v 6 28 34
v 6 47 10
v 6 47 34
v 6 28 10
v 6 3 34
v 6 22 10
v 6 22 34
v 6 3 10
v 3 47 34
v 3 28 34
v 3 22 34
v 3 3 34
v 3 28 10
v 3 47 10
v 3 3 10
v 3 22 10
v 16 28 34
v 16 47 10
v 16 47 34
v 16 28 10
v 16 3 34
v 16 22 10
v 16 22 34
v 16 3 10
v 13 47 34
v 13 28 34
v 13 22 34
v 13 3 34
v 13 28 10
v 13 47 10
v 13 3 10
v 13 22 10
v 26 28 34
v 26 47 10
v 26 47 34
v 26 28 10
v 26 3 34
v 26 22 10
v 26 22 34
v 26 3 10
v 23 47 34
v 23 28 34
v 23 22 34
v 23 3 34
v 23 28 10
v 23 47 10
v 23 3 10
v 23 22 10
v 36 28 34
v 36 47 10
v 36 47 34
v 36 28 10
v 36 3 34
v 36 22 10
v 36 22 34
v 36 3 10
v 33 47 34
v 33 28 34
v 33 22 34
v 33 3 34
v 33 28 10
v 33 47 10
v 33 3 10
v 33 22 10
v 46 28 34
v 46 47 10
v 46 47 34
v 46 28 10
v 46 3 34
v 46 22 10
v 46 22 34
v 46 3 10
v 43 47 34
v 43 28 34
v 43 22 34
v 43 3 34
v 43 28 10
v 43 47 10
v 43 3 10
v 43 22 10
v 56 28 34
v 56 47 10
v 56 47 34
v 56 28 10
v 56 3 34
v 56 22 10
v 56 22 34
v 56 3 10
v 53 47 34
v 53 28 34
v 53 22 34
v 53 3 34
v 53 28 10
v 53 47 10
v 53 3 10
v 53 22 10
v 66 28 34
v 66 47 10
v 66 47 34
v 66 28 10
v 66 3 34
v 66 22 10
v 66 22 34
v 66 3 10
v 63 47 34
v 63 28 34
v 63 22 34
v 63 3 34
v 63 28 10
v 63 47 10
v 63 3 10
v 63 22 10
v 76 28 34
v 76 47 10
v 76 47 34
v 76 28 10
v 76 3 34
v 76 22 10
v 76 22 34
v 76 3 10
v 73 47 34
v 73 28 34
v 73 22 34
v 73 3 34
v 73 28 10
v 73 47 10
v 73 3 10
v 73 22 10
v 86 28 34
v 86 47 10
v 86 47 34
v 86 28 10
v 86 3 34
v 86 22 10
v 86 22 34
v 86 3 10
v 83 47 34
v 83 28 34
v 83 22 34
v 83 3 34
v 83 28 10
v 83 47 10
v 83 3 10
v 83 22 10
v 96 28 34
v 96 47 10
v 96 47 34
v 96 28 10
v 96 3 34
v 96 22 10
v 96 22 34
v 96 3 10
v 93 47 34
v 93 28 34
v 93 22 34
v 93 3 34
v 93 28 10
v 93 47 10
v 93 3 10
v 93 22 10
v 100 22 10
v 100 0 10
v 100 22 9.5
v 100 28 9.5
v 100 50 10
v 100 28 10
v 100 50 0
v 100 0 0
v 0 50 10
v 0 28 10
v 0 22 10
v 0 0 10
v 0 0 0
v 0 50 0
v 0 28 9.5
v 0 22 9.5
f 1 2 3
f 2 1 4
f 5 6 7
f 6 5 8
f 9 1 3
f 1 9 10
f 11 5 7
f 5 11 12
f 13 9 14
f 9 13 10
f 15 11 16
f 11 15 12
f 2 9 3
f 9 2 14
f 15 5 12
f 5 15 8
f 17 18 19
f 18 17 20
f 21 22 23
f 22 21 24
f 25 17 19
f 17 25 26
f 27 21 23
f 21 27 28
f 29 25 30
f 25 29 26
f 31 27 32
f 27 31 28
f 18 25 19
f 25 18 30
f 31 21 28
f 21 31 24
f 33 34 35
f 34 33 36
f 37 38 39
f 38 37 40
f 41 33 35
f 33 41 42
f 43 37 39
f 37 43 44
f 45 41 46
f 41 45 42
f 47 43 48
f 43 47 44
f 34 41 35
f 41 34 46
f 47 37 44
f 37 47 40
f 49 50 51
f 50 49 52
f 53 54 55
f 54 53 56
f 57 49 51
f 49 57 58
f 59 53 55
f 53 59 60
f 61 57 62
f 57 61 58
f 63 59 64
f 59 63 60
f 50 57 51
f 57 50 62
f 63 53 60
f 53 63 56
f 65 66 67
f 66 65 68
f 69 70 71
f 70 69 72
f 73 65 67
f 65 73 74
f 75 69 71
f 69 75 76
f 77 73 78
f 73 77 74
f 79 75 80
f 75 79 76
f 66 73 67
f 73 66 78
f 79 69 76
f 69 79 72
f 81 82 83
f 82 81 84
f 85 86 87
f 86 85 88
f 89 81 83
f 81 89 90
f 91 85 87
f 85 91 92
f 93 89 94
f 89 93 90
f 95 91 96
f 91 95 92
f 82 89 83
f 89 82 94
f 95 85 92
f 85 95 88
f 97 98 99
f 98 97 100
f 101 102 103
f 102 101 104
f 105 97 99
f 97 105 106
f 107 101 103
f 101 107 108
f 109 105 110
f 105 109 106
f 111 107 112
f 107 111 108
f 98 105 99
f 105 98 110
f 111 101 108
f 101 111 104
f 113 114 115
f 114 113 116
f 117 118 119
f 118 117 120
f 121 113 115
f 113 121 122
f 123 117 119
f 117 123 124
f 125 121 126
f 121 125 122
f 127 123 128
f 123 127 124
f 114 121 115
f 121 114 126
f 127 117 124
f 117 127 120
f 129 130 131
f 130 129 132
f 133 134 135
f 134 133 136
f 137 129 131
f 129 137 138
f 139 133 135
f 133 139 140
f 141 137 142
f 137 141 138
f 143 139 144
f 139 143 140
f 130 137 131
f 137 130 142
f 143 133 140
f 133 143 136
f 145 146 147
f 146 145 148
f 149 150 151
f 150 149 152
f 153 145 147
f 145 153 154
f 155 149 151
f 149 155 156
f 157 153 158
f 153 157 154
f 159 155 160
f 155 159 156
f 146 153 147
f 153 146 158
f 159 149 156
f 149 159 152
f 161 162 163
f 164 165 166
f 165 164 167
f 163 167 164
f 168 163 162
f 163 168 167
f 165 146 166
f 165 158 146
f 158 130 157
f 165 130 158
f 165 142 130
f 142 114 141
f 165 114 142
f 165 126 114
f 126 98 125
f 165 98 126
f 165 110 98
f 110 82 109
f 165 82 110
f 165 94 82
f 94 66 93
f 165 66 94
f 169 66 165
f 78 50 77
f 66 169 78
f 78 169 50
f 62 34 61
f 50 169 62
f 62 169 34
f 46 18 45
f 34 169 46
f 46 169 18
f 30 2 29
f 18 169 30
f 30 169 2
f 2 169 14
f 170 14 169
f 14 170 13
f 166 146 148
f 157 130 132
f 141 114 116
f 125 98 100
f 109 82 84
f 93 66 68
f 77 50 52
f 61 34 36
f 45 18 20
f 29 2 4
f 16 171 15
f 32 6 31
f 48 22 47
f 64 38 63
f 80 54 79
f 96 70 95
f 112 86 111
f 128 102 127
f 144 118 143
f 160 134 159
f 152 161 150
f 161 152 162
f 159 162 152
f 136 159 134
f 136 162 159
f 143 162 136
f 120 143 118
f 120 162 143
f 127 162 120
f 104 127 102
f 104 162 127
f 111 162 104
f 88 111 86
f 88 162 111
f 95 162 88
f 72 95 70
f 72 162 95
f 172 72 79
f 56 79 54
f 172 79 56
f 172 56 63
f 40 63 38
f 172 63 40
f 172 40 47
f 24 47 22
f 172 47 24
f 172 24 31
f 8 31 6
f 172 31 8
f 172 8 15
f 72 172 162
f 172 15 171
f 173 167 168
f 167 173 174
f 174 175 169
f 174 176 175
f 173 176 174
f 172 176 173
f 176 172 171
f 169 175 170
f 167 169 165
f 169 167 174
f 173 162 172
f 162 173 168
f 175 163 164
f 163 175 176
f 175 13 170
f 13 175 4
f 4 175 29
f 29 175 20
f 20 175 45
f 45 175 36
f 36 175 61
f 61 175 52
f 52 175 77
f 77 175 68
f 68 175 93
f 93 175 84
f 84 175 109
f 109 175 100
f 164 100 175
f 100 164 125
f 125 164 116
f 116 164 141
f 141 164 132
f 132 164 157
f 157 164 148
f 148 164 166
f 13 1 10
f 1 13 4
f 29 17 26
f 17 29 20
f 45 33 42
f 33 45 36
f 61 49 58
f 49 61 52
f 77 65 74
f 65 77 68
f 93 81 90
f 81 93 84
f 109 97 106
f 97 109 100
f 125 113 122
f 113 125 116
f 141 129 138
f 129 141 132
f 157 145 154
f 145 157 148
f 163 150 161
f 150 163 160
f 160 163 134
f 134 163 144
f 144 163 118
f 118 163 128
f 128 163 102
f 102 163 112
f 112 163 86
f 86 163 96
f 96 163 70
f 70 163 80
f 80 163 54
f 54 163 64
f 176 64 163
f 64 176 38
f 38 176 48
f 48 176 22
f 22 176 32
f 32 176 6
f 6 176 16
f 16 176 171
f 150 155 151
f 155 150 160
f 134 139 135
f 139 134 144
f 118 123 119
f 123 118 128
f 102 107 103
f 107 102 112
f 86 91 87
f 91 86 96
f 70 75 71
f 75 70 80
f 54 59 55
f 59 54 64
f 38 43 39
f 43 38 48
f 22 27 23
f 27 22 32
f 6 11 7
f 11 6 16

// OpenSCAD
$fn = 32;

// ----------------------------------------------------------------------
// Heatsink: slotted fin block
// ----------------------------------------------------------------------

// --- parameters (mm) ---
base_l = 100;             // base length, X
base_w = 50;              // base width, Y
base_t = 10;              // base plate thickness
fin_h = 25;               // fin height above the base
fin_t = 3;                // fin thickness
edge = 3;                 // margin from the base ends
pitch = 10;               // fin pitch
slot_w = 6;               // central slot width, Y

n_fins = floor((base_l - 2 * edge - fin_t) / pitch) + 1;  // fin count
total_h = base_t + fin_h - 1;  // overall height

difference() {
union() {
  cube([base_l, base_w, base_t]);
  for (i = [0 : n_fins - 1])
    translate([edge + i * pitch, edge, base_t - 1])
      cube([fin_t, base_w - 2 * edge, fin_h]);
}
  translate([-1, base_w / 2 - slot_w / 2, base_t - 0.5])
    cube([base_l + 2, slot_w, fin_h + 2]);
}
